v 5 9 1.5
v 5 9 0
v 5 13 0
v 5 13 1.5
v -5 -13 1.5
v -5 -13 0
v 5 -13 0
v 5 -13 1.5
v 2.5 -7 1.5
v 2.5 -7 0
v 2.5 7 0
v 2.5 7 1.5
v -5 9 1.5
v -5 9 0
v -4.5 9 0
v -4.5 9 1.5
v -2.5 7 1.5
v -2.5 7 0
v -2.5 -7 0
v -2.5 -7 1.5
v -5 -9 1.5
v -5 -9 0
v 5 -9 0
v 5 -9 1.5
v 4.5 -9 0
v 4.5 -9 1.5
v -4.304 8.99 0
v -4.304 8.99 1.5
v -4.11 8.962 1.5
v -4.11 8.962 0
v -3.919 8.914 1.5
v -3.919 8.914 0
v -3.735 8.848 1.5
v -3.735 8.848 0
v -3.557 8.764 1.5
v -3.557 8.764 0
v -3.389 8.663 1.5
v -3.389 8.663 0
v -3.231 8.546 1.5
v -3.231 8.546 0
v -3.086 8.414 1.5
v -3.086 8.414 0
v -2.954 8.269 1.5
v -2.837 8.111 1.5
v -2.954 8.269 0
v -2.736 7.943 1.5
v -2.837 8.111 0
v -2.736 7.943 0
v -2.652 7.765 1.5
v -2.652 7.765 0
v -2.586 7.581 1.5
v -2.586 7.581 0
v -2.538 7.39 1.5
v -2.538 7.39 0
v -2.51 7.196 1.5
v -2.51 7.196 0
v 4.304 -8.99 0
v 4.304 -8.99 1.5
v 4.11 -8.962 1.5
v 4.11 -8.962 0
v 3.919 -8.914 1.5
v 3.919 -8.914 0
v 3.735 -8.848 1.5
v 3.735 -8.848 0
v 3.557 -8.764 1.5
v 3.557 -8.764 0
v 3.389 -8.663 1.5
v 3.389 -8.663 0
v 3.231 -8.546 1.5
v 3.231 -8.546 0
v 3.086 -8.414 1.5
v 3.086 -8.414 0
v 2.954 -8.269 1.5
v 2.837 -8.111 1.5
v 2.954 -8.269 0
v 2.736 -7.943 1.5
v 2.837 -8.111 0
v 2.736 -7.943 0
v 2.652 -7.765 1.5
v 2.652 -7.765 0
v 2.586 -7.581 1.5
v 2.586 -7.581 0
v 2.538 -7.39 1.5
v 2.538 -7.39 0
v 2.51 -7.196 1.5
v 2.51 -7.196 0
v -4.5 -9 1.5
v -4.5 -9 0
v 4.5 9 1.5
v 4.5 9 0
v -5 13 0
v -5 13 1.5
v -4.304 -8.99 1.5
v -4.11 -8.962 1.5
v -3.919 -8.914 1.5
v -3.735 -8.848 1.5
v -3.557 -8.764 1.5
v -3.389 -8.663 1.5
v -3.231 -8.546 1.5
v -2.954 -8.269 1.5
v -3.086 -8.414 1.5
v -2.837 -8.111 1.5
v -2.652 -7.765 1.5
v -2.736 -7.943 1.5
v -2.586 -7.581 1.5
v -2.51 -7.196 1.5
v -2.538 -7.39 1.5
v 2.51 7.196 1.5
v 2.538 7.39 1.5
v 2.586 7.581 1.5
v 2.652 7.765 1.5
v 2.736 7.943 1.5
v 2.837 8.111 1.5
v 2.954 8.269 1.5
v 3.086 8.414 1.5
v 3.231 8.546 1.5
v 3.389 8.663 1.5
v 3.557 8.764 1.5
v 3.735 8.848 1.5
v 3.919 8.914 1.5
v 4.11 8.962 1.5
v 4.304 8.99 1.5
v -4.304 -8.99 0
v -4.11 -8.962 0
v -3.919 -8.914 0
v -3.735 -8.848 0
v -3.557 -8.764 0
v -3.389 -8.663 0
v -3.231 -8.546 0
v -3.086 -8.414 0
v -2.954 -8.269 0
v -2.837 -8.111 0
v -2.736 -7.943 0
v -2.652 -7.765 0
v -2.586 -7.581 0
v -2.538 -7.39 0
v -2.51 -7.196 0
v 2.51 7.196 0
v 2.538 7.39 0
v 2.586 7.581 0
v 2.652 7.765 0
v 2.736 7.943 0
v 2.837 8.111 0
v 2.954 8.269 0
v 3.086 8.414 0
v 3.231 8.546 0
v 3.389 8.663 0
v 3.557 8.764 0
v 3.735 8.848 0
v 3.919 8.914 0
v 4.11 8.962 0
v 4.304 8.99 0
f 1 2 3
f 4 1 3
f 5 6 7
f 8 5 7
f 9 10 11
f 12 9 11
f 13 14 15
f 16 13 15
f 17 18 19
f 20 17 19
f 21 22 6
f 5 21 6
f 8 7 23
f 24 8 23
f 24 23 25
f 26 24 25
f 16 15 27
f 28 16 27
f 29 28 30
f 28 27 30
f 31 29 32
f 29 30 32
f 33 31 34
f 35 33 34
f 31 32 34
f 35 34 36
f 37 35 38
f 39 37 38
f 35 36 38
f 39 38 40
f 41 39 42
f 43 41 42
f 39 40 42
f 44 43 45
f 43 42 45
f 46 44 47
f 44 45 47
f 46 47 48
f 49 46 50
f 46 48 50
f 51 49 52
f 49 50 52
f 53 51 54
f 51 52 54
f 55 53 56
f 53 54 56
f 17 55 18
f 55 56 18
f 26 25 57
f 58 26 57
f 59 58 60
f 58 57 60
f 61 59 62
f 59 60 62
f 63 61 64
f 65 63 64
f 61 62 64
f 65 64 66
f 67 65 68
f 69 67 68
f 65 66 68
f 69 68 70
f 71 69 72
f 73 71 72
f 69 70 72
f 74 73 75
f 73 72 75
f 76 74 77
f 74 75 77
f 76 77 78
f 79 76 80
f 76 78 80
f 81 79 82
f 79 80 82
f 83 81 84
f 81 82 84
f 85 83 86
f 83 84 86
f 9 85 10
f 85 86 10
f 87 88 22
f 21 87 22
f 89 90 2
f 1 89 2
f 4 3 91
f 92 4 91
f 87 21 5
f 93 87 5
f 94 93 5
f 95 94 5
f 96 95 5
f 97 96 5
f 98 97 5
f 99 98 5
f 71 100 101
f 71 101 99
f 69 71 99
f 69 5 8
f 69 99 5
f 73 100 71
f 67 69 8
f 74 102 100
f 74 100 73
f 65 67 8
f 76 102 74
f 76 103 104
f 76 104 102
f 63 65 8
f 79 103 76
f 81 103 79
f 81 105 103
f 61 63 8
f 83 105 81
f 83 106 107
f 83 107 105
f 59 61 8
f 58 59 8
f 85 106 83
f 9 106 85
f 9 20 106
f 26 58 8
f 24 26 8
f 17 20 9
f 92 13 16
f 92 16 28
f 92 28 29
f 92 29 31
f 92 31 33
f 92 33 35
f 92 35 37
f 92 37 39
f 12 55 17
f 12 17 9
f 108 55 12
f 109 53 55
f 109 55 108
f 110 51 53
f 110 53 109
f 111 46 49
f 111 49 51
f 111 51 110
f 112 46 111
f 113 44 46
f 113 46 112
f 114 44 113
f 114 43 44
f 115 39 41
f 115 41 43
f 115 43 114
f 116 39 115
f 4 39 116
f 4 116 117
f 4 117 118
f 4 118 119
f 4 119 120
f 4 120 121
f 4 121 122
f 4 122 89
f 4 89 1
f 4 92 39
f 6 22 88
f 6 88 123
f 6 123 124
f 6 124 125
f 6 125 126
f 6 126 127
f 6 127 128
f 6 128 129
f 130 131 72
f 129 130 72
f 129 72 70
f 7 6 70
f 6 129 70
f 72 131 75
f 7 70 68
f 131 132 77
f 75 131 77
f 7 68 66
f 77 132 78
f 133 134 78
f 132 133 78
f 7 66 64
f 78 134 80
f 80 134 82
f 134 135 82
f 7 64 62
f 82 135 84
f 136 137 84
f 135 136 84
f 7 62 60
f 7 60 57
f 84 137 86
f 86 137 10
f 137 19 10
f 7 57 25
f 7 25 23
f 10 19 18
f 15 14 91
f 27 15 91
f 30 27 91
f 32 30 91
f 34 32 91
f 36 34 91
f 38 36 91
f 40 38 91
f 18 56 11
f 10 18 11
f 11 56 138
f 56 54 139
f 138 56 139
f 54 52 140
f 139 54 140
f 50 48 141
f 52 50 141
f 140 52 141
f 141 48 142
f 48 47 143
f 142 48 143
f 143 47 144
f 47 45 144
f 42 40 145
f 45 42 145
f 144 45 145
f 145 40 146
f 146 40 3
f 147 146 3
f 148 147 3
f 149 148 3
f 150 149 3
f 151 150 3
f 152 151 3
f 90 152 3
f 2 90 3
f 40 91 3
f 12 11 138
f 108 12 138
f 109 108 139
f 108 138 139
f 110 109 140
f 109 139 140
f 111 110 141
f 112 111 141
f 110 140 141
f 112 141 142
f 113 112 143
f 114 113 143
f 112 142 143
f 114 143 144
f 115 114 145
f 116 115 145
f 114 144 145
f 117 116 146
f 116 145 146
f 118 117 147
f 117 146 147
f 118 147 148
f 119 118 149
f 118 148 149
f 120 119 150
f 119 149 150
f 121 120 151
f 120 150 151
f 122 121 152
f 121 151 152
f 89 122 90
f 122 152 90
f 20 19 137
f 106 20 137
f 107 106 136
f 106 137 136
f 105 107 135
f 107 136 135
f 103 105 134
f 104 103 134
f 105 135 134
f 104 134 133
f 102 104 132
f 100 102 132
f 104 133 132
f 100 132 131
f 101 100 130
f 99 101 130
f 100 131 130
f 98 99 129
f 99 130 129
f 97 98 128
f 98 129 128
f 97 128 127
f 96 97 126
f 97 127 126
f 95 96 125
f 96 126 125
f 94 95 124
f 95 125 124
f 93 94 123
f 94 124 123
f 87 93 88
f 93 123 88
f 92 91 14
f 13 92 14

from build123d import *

# Parameters (mm, degrees)
F1_DEPTH = 1.5


with BuildPart() as f1:
    # F0 (on Top) → F1 (new body)
    with BuildSketch(Plane.XY):
        with BuildLine():
            Line((-2.5, 0), (0, 0))
            Line((0, 0), (0, 13))
            Line((0, 13), (-5, 13))
            Line((-5, 13), (-5, 9))
            Line((-5, 9), (-4.5, 9))
            ThreePointArc((-4.5, 9), (-3.085786, 8.414214), (-2.5, 7))
            Line((-2.5, 7), (-2.5, 0))
        make_face()
        with BuildLine():
            Line((0, 13), (0, 0))
            Line((0, 0), (2.5, 0))
            Line((2.5, 0), (2.5, 7))
            ThreePointArc((2.5, 7), (3.085786, 8.414214), (4.5, 9))
            Line((4.5, 9), (5, 9))
            Line((5, 9), (5, 13))
            Line((5, 13), (0, 13))
        make_face()
        with BuildLine():
            Line((0, -13), (0, 0))
            Line((0, 0), (-2.5, 0))
            Line((-2.5, 0), (-2.5, -7))
            ThreePointArc((-2.5, -7), (-3.085786, -8.414214), (-4.5, -9))
            Line((-4.5, -9), (-5, -9))
            Line((-5, -9), (-5, -13))
            Line((-5, -13), (0, -13))
        make_face()
        with BuildLine():
            Line((2.5, 0), (0, 0))
            Line((0, 0), (0, -13))
            Line((0, -13), (5, -13))
            Line((5, -13), (5, -9))
            Line((5, -9), (4.5, -9))
            ThreePointArc((4.5, -9), (3.085786, -8.414214), (2.5, -7))
            Line((2.5, -7), (2.5, 0))
        make_face()
    extrude(amount=F1_DEPTH)


solid = f1.part
